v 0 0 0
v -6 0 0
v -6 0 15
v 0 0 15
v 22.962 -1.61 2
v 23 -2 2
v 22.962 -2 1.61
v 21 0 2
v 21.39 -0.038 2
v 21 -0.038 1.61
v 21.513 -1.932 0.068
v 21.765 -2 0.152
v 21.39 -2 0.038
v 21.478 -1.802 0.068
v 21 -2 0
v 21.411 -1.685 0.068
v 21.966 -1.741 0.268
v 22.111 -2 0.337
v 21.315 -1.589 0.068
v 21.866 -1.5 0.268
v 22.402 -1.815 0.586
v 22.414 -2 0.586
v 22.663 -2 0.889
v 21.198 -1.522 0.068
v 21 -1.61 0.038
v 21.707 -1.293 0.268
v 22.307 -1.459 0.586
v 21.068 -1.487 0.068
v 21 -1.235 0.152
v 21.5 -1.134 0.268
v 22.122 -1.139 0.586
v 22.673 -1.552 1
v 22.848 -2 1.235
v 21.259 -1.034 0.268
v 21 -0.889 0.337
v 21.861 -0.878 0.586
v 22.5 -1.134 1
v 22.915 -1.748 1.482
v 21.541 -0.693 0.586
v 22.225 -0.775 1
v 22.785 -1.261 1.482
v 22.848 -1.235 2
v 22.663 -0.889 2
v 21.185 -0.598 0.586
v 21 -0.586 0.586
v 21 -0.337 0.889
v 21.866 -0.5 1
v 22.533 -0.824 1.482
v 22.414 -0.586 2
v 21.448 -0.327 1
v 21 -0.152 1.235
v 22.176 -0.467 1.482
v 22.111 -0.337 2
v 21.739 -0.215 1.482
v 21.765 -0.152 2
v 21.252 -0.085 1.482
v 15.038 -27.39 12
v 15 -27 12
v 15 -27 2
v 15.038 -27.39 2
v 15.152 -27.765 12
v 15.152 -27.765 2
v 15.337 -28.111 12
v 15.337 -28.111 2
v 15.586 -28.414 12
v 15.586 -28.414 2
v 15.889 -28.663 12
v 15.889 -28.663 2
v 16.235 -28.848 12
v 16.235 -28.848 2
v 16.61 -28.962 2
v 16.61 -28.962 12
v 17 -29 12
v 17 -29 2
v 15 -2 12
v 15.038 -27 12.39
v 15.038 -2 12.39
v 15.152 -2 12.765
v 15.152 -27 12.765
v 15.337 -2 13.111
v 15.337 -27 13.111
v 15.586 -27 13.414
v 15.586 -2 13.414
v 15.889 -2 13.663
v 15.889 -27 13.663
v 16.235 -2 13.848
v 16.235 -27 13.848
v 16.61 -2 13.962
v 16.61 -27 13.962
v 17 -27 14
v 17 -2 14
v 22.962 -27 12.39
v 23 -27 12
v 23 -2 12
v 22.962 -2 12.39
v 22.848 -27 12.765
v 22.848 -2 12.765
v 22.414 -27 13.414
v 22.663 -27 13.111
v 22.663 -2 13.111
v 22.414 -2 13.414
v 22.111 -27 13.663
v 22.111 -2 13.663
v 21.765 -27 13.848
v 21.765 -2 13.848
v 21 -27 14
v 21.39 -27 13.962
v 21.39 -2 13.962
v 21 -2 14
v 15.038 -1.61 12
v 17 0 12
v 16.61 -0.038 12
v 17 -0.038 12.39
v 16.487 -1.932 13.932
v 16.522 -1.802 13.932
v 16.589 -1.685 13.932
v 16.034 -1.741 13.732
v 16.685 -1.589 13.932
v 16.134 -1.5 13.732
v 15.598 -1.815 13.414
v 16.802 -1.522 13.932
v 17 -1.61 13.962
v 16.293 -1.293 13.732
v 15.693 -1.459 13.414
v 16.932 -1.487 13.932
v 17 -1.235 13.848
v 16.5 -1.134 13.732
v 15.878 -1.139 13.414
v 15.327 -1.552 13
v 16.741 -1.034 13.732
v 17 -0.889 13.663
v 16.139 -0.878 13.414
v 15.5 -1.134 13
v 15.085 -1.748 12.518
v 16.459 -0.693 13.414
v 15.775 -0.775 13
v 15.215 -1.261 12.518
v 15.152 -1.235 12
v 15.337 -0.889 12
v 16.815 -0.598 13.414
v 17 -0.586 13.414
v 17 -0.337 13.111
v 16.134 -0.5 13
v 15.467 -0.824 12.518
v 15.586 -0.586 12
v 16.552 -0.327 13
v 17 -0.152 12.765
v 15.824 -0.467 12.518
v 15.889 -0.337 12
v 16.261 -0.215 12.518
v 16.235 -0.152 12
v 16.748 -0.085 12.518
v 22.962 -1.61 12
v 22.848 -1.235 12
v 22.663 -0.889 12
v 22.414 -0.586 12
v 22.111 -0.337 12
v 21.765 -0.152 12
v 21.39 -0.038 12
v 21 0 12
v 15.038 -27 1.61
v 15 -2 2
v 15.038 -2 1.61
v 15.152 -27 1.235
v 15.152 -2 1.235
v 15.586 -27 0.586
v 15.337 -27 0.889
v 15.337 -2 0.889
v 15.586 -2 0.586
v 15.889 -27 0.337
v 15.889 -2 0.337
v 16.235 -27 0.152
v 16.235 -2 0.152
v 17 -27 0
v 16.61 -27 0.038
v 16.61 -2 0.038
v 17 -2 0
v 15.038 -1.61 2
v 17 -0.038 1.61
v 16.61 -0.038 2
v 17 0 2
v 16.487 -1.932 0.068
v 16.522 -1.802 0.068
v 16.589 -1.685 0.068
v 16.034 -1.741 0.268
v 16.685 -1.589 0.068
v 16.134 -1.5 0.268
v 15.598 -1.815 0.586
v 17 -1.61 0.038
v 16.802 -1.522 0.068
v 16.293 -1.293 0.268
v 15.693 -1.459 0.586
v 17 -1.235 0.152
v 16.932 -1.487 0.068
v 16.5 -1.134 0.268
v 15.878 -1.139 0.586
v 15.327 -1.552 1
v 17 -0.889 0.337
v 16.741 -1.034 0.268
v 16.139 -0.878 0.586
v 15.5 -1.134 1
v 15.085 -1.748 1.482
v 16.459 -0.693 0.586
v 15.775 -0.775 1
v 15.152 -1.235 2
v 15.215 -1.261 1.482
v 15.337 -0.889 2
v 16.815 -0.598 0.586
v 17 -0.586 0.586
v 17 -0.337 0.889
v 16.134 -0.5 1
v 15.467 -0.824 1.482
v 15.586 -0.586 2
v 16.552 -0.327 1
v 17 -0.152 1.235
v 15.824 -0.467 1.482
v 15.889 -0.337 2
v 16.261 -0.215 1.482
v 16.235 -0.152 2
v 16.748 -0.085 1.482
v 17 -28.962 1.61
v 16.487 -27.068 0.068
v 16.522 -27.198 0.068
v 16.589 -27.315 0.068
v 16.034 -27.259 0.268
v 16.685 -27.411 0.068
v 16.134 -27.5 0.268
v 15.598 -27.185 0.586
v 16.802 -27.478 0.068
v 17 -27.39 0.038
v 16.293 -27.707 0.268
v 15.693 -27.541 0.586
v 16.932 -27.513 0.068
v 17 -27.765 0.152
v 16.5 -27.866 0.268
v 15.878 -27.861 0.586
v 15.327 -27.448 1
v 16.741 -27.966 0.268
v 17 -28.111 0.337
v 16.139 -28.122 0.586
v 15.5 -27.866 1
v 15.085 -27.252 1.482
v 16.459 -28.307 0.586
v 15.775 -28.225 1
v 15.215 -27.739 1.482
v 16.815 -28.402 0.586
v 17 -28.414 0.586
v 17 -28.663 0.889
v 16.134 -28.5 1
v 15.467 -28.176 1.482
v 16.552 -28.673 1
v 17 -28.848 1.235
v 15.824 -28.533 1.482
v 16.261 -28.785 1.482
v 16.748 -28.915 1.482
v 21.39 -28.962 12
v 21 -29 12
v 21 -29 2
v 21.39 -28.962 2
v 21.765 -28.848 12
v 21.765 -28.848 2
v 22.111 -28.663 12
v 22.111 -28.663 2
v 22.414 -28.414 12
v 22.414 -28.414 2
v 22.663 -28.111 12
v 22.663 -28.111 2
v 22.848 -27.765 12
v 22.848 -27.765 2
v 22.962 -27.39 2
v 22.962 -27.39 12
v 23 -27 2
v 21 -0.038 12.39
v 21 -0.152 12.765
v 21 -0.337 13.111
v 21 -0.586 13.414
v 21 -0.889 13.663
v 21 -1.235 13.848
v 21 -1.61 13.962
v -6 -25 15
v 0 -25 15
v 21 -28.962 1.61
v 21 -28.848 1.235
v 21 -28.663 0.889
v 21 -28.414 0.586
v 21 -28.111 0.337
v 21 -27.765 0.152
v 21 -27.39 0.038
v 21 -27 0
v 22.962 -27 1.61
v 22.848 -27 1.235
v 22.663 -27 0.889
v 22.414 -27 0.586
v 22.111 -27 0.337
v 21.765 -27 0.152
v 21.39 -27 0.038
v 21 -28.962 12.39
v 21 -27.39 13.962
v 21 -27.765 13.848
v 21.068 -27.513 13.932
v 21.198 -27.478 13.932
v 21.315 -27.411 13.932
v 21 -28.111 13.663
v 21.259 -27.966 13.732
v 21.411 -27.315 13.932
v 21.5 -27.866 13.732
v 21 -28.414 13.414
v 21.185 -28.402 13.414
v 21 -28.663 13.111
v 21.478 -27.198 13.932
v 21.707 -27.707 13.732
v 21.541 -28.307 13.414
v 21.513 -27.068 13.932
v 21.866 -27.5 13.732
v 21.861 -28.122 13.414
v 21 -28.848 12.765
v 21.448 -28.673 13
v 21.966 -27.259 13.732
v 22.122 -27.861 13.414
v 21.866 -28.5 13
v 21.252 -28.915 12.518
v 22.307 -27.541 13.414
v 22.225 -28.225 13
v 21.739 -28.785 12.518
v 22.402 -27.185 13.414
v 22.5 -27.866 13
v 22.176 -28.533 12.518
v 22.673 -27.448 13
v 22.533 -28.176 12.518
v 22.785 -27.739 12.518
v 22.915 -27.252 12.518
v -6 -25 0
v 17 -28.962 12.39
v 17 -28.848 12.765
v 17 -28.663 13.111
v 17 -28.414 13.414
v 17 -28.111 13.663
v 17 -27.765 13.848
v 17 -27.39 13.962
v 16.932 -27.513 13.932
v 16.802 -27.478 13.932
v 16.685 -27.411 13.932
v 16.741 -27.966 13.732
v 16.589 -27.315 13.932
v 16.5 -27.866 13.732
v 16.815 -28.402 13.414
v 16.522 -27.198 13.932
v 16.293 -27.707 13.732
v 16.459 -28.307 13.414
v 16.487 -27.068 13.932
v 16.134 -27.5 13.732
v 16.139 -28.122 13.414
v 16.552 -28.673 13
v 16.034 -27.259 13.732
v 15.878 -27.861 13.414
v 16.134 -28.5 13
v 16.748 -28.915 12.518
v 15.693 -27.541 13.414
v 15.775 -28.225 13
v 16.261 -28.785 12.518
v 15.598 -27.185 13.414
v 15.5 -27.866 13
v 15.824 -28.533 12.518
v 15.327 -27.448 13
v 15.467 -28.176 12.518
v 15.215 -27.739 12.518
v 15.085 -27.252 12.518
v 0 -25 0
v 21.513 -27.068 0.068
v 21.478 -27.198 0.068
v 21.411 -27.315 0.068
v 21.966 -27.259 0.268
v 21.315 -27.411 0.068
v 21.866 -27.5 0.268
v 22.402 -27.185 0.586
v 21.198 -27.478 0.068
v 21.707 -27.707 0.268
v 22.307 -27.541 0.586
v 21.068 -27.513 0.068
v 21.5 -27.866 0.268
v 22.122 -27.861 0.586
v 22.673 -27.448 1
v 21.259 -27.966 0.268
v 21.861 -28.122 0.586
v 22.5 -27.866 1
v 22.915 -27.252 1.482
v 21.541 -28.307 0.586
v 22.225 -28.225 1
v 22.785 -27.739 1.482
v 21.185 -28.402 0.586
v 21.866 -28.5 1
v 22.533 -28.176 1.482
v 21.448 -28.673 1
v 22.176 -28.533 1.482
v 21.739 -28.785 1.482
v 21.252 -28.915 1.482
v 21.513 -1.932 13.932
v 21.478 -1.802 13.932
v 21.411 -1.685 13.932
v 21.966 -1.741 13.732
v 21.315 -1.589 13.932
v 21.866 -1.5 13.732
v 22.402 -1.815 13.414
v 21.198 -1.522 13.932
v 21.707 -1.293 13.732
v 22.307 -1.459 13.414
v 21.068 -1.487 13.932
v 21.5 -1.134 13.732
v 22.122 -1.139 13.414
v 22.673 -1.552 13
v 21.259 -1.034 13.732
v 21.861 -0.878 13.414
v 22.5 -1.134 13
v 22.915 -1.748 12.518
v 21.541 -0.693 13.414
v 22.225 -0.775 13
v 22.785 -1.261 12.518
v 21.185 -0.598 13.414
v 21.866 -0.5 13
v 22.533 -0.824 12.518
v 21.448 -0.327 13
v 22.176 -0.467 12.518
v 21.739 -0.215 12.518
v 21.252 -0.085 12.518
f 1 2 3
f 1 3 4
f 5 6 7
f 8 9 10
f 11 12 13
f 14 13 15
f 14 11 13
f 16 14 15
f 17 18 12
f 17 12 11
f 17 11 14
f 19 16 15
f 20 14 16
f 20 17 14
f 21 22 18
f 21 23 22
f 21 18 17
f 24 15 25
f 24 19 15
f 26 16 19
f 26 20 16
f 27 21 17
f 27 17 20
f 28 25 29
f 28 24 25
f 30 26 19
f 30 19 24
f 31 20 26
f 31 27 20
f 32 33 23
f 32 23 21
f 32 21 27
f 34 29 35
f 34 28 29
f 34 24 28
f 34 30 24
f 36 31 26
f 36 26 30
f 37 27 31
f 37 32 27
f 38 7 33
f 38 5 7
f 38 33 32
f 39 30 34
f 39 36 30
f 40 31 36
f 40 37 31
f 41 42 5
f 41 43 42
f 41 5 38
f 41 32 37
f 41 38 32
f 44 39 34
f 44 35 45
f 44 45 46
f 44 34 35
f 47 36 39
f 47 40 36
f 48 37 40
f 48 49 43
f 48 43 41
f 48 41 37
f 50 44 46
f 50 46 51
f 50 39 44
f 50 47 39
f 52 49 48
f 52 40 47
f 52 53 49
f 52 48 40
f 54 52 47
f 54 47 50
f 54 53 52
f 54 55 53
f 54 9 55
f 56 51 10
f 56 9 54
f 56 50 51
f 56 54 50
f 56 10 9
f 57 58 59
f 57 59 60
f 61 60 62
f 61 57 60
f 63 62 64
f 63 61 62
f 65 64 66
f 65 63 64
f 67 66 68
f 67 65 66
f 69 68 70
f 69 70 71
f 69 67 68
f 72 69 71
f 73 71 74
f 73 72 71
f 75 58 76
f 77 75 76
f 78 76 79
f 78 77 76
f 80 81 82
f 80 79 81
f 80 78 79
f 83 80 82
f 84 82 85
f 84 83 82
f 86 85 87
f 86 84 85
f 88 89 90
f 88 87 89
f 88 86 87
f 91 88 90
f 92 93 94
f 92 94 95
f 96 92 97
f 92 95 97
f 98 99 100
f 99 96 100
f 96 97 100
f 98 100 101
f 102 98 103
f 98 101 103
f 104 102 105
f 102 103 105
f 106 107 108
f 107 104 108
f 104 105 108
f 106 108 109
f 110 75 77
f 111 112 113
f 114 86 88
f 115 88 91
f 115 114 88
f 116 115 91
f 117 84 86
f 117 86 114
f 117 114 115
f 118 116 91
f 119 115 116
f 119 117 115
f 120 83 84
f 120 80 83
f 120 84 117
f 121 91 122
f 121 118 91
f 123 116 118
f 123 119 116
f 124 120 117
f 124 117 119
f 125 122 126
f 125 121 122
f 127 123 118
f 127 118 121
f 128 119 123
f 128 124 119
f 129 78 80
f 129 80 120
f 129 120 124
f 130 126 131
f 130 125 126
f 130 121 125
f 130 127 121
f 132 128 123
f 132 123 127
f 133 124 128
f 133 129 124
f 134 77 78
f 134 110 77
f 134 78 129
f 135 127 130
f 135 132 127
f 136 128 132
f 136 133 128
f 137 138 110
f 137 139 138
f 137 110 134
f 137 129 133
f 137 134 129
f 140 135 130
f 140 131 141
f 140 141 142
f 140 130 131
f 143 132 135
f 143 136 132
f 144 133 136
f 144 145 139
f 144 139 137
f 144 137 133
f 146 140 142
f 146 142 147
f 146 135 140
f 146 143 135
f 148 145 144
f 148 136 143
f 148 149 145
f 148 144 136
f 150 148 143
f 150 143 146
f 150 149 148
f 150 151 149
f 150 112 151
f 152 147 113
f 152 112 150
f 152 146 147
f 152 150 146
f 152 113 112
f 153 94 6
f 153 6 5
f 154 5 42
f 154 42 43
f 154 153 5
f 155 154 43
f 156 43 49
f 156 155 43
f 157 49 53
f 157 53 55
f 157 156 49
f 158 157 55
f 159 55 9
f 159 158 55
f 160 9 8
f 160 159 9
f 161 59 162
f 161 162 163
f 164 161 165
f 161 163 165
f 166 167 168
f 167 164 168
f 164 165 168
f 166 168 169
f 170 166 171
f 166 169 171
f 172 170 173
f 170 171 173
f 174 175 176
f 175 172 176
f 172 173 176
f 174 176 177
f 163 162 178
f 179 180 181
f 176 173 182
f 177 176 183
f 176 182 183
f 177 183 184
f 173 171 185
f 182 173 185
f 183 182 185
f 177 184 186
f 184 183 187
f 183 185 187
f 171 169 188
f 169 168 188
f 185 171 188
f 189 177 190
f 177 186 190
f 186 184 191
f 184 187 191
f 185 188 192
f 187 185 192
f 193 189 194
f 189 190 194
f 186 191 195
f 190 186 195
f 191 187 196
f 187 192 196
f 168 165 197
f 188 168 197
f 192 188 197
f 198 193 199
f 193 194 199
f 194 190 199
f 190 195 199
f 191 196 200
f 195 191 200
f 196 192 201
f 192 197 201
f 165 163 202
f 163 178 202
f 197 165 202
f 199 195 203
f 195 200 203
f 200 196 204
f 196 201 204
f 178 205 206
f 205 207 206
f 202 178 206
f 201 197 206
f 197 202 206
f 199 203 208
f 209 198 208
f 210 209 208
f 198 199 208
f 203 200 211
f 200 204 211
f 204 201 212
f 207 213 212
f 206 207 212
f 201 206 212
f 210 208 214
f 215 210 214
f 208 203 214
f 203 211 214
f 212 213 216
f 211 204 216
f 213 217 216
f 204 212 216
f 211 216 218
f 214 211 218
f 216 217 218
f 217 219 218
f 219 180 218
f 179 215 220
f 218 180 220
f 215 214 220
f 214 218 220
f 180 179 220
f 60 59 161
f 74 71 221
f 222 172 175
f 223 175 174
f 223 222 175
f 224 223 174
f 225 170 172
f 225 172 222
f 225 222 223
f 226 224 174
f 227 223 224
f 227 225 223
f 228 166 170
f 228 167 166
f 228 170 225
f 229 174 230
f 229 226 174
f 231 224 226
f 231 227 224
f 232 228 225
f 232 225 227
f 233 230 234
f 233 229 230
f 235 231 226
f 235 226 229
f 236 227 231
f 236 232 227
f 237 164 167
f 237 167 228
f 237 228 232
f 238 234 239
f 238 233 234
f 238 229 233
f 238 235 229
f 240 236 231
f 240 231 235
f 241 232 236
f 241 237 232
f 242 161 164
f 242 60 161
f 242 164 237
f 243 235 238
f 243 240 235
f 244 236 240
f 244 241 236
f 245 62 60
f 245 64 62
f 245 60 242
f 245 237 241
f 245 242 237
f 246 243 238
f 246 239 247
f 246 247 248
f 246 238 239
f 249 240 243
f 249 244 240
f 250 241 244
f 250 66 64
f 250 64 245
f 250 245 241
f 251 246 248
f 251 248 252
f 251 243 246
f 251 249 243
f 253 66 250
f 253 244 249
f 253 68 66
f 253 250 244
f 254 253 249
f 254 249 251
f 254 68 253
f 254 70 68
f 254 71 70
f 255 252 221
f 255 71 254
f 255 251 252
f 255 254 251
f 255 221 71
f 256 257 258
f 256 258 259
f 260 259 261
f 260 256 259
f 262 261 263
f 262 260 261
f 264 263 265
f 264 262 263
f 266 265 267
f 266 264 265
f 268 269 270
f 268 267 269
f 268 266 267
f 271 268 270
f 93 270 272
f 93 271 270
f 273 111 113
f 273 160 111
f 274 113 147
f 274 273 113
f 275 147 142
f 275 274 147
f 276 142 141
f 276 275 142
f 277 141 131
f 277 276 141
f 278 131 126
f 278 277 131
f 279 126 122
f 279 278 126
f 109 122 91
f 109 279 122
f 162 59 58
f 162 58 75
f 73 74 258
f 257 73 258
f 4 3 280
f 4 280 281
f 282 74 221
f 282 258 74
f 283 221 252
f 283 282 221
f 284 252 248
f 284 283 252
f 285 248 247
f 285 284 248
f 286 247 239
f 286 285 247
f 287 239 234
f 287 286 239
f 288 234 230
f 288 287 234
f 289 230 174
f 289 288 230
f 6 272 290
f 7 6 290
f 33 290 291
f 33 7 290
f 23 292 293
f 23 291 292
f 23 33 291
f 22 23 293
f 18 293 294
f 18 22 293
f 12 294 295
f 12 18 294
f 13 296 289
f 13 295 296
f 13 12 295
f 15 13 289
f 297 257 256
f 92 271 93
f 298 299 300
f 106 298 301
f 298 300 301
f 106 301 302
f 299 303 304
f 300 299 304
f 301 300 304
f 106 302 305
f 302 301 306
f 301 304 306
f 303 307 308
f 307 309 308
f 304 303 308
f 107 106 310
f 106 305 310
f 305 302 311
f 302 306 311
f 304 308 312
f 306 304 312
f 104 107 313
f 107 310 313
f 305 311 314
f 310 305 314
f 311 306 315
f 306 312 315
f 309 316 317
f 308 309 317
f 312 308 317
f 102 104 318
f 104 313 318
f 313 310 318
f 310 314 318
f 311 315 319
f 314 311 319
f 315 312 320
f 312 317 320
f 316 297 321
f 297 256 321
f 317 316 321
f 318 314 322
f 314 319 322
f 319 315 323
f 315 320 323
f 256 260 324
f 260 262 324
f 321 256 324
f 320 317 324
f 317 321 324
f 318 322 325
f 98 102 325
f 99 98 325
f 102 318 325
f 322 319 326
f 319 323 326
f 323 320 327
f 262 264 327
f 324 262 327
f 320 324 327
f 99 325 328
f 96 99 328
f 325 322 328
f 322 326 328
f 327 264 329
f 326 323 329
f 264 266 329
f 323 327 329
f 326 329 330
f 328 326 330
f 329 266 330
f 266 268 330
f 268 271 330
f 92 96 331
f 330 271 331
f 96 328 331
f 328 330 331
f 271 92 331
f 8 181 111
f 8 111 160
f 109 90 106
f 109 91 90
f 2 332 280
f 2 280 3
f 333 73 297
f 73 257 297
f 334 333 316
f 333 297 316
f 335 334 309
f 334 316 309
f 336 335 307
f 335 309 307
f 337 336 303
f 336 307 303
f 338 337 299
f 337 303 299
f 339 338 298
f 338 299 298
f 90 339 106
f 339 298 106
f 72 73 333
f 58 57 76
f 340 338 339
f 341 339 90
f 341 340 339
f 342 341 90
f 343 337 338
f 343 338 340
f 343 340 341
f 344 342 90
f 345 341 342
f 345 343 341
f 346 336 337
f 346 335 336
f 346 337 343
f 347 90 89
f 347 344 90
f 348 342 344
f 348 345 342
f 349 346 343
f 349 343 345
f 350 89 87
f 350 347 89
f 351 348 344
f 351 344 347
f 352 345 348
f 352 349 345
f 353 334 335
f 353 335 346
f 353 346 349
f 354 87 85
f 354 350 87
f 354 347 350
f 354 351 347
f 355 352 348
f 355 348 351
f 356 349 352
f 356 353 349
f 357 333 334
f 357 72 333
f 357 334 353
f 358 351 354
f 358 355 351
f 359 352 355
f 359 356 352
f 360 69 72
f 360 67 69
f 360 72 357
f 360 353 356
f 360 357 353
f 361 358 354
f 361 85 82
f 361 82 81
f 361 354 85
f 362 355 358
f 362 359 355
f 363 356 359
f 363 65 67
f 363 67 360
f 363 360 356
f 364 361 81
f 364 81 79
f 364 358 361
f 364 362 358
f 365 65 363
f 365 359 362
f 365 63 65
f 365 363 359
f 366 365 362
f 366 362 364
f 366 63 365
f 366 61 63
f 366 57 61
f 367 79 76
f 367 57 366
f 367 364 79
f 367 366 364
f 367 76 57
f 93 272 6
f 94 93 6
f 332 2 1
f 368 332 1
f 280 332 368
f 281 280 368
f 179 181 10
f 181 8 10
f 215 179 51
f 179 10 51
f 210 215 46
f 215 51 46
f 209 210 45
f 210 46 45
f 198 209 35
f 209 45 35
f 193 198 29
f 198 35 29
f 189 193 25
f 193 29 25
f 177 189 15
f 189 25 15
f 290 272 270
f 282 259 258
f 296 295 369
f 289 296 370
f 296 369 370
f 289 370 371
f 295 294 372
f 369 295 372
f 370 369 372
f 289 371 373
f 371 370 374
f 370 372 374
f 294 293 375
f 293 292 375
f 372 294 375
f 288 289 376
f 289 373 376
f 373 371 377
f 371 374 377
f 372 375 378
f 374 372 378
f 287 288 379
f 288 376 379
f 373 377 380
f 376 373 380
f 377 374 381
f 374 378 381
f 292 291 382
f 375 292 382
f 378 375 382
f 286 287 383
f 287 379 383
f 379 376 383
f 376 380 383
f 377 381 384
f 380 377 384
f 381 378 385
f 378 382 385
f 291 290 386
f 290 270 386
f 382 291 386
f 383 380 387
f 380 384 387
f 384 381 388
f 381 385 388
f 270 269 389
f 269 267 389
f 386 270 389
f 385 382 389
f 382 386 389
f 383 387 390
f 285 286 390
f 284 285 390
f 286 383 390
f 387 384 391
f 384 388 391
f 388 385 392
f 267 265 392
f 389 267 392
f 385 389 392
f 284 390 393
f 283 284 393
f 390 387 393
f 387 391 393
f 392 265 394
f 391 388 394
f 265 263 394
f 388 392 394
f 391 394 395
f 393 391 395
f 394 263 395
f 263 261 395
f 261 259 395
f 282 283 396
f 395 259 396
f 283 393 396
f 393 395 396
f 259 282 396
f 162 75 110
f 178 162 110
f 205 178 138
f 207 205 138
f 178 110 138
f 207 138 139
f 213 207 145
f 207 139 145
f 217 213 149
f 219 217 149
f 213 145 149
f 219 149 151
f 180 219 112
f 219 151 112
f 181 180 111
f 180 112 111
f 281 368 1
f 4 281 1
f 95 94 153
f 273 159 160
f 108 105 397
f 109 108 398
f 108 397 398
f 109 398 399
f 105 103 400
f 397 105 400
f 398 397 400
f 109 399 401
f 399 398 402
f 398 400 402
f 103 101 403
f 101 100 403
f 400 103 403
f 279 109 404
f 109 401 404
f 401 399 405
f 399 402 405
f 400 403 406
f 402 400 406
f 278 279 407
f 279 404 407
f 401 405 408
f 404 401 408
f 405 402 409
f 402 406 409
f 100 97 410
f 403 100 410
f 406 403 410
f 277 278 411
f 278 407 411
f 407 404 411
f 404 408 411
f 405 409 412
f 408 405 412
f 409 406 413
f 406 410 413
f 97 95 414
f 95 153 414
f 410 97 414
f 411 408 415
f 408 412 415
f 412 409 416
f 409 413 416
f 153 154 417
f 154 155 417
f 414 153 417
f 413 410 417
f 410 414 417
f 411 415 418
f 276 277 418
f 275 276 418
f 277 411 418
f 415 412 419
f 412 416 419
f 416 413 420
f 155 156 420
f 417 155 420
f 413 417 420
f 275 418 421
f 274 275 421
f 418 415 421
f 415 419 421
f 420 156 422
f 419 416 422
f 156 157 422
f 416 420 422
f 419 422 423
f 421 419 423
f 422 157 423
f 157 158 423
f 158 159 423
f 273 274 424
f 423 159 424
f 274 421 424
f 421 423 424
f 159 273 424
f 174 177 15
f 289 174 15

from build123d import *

# Parameters (mm, degrees)
F0_W     = 6
F0_H     = 25
F1_DEPTH = 15
F2_W     = 8
F2_H     = 29
F3_DEPTH = 14
F4_R     = 2


with BuildPart() as f1:
    # F0 (on Top) → F1 (new body)
    with BuildSketch(Plane.XY):
        with Locations((-3, -12.5)):
            Rectangle(F0_W, F0_H)
    extrude(amount=F1_DEPTH)


with BuildPart() as f3:
    # F2 (on Top) → F3 (new body)
    with BuildSketch(Plane.XY):
        with Locations((19, -14.5)):
            Rectangle(F2_W, F2_H)
    extrude(amount=F3_DEPTH)

    # F4
    f4_edges = [f3.edges().sort_by_distance(p)[0] for p in [
        (23, -29, 7),
        (15, -29, 7),
        (23, 0, 7),
        (15, 0, 7),
        (19, -29, 14),
        (23, -14.5, 14),
        (15, -14.5, 14),
        (19, 0, 14),
        (15, -14.5, 0),
        (23, -14.5, 0),
        (19, -29, 0),
        (19, 0, 0),
    ]]
    fillet(f4_edges, radius=F4_R)


solid = Compound([f1.part, f3.part])
